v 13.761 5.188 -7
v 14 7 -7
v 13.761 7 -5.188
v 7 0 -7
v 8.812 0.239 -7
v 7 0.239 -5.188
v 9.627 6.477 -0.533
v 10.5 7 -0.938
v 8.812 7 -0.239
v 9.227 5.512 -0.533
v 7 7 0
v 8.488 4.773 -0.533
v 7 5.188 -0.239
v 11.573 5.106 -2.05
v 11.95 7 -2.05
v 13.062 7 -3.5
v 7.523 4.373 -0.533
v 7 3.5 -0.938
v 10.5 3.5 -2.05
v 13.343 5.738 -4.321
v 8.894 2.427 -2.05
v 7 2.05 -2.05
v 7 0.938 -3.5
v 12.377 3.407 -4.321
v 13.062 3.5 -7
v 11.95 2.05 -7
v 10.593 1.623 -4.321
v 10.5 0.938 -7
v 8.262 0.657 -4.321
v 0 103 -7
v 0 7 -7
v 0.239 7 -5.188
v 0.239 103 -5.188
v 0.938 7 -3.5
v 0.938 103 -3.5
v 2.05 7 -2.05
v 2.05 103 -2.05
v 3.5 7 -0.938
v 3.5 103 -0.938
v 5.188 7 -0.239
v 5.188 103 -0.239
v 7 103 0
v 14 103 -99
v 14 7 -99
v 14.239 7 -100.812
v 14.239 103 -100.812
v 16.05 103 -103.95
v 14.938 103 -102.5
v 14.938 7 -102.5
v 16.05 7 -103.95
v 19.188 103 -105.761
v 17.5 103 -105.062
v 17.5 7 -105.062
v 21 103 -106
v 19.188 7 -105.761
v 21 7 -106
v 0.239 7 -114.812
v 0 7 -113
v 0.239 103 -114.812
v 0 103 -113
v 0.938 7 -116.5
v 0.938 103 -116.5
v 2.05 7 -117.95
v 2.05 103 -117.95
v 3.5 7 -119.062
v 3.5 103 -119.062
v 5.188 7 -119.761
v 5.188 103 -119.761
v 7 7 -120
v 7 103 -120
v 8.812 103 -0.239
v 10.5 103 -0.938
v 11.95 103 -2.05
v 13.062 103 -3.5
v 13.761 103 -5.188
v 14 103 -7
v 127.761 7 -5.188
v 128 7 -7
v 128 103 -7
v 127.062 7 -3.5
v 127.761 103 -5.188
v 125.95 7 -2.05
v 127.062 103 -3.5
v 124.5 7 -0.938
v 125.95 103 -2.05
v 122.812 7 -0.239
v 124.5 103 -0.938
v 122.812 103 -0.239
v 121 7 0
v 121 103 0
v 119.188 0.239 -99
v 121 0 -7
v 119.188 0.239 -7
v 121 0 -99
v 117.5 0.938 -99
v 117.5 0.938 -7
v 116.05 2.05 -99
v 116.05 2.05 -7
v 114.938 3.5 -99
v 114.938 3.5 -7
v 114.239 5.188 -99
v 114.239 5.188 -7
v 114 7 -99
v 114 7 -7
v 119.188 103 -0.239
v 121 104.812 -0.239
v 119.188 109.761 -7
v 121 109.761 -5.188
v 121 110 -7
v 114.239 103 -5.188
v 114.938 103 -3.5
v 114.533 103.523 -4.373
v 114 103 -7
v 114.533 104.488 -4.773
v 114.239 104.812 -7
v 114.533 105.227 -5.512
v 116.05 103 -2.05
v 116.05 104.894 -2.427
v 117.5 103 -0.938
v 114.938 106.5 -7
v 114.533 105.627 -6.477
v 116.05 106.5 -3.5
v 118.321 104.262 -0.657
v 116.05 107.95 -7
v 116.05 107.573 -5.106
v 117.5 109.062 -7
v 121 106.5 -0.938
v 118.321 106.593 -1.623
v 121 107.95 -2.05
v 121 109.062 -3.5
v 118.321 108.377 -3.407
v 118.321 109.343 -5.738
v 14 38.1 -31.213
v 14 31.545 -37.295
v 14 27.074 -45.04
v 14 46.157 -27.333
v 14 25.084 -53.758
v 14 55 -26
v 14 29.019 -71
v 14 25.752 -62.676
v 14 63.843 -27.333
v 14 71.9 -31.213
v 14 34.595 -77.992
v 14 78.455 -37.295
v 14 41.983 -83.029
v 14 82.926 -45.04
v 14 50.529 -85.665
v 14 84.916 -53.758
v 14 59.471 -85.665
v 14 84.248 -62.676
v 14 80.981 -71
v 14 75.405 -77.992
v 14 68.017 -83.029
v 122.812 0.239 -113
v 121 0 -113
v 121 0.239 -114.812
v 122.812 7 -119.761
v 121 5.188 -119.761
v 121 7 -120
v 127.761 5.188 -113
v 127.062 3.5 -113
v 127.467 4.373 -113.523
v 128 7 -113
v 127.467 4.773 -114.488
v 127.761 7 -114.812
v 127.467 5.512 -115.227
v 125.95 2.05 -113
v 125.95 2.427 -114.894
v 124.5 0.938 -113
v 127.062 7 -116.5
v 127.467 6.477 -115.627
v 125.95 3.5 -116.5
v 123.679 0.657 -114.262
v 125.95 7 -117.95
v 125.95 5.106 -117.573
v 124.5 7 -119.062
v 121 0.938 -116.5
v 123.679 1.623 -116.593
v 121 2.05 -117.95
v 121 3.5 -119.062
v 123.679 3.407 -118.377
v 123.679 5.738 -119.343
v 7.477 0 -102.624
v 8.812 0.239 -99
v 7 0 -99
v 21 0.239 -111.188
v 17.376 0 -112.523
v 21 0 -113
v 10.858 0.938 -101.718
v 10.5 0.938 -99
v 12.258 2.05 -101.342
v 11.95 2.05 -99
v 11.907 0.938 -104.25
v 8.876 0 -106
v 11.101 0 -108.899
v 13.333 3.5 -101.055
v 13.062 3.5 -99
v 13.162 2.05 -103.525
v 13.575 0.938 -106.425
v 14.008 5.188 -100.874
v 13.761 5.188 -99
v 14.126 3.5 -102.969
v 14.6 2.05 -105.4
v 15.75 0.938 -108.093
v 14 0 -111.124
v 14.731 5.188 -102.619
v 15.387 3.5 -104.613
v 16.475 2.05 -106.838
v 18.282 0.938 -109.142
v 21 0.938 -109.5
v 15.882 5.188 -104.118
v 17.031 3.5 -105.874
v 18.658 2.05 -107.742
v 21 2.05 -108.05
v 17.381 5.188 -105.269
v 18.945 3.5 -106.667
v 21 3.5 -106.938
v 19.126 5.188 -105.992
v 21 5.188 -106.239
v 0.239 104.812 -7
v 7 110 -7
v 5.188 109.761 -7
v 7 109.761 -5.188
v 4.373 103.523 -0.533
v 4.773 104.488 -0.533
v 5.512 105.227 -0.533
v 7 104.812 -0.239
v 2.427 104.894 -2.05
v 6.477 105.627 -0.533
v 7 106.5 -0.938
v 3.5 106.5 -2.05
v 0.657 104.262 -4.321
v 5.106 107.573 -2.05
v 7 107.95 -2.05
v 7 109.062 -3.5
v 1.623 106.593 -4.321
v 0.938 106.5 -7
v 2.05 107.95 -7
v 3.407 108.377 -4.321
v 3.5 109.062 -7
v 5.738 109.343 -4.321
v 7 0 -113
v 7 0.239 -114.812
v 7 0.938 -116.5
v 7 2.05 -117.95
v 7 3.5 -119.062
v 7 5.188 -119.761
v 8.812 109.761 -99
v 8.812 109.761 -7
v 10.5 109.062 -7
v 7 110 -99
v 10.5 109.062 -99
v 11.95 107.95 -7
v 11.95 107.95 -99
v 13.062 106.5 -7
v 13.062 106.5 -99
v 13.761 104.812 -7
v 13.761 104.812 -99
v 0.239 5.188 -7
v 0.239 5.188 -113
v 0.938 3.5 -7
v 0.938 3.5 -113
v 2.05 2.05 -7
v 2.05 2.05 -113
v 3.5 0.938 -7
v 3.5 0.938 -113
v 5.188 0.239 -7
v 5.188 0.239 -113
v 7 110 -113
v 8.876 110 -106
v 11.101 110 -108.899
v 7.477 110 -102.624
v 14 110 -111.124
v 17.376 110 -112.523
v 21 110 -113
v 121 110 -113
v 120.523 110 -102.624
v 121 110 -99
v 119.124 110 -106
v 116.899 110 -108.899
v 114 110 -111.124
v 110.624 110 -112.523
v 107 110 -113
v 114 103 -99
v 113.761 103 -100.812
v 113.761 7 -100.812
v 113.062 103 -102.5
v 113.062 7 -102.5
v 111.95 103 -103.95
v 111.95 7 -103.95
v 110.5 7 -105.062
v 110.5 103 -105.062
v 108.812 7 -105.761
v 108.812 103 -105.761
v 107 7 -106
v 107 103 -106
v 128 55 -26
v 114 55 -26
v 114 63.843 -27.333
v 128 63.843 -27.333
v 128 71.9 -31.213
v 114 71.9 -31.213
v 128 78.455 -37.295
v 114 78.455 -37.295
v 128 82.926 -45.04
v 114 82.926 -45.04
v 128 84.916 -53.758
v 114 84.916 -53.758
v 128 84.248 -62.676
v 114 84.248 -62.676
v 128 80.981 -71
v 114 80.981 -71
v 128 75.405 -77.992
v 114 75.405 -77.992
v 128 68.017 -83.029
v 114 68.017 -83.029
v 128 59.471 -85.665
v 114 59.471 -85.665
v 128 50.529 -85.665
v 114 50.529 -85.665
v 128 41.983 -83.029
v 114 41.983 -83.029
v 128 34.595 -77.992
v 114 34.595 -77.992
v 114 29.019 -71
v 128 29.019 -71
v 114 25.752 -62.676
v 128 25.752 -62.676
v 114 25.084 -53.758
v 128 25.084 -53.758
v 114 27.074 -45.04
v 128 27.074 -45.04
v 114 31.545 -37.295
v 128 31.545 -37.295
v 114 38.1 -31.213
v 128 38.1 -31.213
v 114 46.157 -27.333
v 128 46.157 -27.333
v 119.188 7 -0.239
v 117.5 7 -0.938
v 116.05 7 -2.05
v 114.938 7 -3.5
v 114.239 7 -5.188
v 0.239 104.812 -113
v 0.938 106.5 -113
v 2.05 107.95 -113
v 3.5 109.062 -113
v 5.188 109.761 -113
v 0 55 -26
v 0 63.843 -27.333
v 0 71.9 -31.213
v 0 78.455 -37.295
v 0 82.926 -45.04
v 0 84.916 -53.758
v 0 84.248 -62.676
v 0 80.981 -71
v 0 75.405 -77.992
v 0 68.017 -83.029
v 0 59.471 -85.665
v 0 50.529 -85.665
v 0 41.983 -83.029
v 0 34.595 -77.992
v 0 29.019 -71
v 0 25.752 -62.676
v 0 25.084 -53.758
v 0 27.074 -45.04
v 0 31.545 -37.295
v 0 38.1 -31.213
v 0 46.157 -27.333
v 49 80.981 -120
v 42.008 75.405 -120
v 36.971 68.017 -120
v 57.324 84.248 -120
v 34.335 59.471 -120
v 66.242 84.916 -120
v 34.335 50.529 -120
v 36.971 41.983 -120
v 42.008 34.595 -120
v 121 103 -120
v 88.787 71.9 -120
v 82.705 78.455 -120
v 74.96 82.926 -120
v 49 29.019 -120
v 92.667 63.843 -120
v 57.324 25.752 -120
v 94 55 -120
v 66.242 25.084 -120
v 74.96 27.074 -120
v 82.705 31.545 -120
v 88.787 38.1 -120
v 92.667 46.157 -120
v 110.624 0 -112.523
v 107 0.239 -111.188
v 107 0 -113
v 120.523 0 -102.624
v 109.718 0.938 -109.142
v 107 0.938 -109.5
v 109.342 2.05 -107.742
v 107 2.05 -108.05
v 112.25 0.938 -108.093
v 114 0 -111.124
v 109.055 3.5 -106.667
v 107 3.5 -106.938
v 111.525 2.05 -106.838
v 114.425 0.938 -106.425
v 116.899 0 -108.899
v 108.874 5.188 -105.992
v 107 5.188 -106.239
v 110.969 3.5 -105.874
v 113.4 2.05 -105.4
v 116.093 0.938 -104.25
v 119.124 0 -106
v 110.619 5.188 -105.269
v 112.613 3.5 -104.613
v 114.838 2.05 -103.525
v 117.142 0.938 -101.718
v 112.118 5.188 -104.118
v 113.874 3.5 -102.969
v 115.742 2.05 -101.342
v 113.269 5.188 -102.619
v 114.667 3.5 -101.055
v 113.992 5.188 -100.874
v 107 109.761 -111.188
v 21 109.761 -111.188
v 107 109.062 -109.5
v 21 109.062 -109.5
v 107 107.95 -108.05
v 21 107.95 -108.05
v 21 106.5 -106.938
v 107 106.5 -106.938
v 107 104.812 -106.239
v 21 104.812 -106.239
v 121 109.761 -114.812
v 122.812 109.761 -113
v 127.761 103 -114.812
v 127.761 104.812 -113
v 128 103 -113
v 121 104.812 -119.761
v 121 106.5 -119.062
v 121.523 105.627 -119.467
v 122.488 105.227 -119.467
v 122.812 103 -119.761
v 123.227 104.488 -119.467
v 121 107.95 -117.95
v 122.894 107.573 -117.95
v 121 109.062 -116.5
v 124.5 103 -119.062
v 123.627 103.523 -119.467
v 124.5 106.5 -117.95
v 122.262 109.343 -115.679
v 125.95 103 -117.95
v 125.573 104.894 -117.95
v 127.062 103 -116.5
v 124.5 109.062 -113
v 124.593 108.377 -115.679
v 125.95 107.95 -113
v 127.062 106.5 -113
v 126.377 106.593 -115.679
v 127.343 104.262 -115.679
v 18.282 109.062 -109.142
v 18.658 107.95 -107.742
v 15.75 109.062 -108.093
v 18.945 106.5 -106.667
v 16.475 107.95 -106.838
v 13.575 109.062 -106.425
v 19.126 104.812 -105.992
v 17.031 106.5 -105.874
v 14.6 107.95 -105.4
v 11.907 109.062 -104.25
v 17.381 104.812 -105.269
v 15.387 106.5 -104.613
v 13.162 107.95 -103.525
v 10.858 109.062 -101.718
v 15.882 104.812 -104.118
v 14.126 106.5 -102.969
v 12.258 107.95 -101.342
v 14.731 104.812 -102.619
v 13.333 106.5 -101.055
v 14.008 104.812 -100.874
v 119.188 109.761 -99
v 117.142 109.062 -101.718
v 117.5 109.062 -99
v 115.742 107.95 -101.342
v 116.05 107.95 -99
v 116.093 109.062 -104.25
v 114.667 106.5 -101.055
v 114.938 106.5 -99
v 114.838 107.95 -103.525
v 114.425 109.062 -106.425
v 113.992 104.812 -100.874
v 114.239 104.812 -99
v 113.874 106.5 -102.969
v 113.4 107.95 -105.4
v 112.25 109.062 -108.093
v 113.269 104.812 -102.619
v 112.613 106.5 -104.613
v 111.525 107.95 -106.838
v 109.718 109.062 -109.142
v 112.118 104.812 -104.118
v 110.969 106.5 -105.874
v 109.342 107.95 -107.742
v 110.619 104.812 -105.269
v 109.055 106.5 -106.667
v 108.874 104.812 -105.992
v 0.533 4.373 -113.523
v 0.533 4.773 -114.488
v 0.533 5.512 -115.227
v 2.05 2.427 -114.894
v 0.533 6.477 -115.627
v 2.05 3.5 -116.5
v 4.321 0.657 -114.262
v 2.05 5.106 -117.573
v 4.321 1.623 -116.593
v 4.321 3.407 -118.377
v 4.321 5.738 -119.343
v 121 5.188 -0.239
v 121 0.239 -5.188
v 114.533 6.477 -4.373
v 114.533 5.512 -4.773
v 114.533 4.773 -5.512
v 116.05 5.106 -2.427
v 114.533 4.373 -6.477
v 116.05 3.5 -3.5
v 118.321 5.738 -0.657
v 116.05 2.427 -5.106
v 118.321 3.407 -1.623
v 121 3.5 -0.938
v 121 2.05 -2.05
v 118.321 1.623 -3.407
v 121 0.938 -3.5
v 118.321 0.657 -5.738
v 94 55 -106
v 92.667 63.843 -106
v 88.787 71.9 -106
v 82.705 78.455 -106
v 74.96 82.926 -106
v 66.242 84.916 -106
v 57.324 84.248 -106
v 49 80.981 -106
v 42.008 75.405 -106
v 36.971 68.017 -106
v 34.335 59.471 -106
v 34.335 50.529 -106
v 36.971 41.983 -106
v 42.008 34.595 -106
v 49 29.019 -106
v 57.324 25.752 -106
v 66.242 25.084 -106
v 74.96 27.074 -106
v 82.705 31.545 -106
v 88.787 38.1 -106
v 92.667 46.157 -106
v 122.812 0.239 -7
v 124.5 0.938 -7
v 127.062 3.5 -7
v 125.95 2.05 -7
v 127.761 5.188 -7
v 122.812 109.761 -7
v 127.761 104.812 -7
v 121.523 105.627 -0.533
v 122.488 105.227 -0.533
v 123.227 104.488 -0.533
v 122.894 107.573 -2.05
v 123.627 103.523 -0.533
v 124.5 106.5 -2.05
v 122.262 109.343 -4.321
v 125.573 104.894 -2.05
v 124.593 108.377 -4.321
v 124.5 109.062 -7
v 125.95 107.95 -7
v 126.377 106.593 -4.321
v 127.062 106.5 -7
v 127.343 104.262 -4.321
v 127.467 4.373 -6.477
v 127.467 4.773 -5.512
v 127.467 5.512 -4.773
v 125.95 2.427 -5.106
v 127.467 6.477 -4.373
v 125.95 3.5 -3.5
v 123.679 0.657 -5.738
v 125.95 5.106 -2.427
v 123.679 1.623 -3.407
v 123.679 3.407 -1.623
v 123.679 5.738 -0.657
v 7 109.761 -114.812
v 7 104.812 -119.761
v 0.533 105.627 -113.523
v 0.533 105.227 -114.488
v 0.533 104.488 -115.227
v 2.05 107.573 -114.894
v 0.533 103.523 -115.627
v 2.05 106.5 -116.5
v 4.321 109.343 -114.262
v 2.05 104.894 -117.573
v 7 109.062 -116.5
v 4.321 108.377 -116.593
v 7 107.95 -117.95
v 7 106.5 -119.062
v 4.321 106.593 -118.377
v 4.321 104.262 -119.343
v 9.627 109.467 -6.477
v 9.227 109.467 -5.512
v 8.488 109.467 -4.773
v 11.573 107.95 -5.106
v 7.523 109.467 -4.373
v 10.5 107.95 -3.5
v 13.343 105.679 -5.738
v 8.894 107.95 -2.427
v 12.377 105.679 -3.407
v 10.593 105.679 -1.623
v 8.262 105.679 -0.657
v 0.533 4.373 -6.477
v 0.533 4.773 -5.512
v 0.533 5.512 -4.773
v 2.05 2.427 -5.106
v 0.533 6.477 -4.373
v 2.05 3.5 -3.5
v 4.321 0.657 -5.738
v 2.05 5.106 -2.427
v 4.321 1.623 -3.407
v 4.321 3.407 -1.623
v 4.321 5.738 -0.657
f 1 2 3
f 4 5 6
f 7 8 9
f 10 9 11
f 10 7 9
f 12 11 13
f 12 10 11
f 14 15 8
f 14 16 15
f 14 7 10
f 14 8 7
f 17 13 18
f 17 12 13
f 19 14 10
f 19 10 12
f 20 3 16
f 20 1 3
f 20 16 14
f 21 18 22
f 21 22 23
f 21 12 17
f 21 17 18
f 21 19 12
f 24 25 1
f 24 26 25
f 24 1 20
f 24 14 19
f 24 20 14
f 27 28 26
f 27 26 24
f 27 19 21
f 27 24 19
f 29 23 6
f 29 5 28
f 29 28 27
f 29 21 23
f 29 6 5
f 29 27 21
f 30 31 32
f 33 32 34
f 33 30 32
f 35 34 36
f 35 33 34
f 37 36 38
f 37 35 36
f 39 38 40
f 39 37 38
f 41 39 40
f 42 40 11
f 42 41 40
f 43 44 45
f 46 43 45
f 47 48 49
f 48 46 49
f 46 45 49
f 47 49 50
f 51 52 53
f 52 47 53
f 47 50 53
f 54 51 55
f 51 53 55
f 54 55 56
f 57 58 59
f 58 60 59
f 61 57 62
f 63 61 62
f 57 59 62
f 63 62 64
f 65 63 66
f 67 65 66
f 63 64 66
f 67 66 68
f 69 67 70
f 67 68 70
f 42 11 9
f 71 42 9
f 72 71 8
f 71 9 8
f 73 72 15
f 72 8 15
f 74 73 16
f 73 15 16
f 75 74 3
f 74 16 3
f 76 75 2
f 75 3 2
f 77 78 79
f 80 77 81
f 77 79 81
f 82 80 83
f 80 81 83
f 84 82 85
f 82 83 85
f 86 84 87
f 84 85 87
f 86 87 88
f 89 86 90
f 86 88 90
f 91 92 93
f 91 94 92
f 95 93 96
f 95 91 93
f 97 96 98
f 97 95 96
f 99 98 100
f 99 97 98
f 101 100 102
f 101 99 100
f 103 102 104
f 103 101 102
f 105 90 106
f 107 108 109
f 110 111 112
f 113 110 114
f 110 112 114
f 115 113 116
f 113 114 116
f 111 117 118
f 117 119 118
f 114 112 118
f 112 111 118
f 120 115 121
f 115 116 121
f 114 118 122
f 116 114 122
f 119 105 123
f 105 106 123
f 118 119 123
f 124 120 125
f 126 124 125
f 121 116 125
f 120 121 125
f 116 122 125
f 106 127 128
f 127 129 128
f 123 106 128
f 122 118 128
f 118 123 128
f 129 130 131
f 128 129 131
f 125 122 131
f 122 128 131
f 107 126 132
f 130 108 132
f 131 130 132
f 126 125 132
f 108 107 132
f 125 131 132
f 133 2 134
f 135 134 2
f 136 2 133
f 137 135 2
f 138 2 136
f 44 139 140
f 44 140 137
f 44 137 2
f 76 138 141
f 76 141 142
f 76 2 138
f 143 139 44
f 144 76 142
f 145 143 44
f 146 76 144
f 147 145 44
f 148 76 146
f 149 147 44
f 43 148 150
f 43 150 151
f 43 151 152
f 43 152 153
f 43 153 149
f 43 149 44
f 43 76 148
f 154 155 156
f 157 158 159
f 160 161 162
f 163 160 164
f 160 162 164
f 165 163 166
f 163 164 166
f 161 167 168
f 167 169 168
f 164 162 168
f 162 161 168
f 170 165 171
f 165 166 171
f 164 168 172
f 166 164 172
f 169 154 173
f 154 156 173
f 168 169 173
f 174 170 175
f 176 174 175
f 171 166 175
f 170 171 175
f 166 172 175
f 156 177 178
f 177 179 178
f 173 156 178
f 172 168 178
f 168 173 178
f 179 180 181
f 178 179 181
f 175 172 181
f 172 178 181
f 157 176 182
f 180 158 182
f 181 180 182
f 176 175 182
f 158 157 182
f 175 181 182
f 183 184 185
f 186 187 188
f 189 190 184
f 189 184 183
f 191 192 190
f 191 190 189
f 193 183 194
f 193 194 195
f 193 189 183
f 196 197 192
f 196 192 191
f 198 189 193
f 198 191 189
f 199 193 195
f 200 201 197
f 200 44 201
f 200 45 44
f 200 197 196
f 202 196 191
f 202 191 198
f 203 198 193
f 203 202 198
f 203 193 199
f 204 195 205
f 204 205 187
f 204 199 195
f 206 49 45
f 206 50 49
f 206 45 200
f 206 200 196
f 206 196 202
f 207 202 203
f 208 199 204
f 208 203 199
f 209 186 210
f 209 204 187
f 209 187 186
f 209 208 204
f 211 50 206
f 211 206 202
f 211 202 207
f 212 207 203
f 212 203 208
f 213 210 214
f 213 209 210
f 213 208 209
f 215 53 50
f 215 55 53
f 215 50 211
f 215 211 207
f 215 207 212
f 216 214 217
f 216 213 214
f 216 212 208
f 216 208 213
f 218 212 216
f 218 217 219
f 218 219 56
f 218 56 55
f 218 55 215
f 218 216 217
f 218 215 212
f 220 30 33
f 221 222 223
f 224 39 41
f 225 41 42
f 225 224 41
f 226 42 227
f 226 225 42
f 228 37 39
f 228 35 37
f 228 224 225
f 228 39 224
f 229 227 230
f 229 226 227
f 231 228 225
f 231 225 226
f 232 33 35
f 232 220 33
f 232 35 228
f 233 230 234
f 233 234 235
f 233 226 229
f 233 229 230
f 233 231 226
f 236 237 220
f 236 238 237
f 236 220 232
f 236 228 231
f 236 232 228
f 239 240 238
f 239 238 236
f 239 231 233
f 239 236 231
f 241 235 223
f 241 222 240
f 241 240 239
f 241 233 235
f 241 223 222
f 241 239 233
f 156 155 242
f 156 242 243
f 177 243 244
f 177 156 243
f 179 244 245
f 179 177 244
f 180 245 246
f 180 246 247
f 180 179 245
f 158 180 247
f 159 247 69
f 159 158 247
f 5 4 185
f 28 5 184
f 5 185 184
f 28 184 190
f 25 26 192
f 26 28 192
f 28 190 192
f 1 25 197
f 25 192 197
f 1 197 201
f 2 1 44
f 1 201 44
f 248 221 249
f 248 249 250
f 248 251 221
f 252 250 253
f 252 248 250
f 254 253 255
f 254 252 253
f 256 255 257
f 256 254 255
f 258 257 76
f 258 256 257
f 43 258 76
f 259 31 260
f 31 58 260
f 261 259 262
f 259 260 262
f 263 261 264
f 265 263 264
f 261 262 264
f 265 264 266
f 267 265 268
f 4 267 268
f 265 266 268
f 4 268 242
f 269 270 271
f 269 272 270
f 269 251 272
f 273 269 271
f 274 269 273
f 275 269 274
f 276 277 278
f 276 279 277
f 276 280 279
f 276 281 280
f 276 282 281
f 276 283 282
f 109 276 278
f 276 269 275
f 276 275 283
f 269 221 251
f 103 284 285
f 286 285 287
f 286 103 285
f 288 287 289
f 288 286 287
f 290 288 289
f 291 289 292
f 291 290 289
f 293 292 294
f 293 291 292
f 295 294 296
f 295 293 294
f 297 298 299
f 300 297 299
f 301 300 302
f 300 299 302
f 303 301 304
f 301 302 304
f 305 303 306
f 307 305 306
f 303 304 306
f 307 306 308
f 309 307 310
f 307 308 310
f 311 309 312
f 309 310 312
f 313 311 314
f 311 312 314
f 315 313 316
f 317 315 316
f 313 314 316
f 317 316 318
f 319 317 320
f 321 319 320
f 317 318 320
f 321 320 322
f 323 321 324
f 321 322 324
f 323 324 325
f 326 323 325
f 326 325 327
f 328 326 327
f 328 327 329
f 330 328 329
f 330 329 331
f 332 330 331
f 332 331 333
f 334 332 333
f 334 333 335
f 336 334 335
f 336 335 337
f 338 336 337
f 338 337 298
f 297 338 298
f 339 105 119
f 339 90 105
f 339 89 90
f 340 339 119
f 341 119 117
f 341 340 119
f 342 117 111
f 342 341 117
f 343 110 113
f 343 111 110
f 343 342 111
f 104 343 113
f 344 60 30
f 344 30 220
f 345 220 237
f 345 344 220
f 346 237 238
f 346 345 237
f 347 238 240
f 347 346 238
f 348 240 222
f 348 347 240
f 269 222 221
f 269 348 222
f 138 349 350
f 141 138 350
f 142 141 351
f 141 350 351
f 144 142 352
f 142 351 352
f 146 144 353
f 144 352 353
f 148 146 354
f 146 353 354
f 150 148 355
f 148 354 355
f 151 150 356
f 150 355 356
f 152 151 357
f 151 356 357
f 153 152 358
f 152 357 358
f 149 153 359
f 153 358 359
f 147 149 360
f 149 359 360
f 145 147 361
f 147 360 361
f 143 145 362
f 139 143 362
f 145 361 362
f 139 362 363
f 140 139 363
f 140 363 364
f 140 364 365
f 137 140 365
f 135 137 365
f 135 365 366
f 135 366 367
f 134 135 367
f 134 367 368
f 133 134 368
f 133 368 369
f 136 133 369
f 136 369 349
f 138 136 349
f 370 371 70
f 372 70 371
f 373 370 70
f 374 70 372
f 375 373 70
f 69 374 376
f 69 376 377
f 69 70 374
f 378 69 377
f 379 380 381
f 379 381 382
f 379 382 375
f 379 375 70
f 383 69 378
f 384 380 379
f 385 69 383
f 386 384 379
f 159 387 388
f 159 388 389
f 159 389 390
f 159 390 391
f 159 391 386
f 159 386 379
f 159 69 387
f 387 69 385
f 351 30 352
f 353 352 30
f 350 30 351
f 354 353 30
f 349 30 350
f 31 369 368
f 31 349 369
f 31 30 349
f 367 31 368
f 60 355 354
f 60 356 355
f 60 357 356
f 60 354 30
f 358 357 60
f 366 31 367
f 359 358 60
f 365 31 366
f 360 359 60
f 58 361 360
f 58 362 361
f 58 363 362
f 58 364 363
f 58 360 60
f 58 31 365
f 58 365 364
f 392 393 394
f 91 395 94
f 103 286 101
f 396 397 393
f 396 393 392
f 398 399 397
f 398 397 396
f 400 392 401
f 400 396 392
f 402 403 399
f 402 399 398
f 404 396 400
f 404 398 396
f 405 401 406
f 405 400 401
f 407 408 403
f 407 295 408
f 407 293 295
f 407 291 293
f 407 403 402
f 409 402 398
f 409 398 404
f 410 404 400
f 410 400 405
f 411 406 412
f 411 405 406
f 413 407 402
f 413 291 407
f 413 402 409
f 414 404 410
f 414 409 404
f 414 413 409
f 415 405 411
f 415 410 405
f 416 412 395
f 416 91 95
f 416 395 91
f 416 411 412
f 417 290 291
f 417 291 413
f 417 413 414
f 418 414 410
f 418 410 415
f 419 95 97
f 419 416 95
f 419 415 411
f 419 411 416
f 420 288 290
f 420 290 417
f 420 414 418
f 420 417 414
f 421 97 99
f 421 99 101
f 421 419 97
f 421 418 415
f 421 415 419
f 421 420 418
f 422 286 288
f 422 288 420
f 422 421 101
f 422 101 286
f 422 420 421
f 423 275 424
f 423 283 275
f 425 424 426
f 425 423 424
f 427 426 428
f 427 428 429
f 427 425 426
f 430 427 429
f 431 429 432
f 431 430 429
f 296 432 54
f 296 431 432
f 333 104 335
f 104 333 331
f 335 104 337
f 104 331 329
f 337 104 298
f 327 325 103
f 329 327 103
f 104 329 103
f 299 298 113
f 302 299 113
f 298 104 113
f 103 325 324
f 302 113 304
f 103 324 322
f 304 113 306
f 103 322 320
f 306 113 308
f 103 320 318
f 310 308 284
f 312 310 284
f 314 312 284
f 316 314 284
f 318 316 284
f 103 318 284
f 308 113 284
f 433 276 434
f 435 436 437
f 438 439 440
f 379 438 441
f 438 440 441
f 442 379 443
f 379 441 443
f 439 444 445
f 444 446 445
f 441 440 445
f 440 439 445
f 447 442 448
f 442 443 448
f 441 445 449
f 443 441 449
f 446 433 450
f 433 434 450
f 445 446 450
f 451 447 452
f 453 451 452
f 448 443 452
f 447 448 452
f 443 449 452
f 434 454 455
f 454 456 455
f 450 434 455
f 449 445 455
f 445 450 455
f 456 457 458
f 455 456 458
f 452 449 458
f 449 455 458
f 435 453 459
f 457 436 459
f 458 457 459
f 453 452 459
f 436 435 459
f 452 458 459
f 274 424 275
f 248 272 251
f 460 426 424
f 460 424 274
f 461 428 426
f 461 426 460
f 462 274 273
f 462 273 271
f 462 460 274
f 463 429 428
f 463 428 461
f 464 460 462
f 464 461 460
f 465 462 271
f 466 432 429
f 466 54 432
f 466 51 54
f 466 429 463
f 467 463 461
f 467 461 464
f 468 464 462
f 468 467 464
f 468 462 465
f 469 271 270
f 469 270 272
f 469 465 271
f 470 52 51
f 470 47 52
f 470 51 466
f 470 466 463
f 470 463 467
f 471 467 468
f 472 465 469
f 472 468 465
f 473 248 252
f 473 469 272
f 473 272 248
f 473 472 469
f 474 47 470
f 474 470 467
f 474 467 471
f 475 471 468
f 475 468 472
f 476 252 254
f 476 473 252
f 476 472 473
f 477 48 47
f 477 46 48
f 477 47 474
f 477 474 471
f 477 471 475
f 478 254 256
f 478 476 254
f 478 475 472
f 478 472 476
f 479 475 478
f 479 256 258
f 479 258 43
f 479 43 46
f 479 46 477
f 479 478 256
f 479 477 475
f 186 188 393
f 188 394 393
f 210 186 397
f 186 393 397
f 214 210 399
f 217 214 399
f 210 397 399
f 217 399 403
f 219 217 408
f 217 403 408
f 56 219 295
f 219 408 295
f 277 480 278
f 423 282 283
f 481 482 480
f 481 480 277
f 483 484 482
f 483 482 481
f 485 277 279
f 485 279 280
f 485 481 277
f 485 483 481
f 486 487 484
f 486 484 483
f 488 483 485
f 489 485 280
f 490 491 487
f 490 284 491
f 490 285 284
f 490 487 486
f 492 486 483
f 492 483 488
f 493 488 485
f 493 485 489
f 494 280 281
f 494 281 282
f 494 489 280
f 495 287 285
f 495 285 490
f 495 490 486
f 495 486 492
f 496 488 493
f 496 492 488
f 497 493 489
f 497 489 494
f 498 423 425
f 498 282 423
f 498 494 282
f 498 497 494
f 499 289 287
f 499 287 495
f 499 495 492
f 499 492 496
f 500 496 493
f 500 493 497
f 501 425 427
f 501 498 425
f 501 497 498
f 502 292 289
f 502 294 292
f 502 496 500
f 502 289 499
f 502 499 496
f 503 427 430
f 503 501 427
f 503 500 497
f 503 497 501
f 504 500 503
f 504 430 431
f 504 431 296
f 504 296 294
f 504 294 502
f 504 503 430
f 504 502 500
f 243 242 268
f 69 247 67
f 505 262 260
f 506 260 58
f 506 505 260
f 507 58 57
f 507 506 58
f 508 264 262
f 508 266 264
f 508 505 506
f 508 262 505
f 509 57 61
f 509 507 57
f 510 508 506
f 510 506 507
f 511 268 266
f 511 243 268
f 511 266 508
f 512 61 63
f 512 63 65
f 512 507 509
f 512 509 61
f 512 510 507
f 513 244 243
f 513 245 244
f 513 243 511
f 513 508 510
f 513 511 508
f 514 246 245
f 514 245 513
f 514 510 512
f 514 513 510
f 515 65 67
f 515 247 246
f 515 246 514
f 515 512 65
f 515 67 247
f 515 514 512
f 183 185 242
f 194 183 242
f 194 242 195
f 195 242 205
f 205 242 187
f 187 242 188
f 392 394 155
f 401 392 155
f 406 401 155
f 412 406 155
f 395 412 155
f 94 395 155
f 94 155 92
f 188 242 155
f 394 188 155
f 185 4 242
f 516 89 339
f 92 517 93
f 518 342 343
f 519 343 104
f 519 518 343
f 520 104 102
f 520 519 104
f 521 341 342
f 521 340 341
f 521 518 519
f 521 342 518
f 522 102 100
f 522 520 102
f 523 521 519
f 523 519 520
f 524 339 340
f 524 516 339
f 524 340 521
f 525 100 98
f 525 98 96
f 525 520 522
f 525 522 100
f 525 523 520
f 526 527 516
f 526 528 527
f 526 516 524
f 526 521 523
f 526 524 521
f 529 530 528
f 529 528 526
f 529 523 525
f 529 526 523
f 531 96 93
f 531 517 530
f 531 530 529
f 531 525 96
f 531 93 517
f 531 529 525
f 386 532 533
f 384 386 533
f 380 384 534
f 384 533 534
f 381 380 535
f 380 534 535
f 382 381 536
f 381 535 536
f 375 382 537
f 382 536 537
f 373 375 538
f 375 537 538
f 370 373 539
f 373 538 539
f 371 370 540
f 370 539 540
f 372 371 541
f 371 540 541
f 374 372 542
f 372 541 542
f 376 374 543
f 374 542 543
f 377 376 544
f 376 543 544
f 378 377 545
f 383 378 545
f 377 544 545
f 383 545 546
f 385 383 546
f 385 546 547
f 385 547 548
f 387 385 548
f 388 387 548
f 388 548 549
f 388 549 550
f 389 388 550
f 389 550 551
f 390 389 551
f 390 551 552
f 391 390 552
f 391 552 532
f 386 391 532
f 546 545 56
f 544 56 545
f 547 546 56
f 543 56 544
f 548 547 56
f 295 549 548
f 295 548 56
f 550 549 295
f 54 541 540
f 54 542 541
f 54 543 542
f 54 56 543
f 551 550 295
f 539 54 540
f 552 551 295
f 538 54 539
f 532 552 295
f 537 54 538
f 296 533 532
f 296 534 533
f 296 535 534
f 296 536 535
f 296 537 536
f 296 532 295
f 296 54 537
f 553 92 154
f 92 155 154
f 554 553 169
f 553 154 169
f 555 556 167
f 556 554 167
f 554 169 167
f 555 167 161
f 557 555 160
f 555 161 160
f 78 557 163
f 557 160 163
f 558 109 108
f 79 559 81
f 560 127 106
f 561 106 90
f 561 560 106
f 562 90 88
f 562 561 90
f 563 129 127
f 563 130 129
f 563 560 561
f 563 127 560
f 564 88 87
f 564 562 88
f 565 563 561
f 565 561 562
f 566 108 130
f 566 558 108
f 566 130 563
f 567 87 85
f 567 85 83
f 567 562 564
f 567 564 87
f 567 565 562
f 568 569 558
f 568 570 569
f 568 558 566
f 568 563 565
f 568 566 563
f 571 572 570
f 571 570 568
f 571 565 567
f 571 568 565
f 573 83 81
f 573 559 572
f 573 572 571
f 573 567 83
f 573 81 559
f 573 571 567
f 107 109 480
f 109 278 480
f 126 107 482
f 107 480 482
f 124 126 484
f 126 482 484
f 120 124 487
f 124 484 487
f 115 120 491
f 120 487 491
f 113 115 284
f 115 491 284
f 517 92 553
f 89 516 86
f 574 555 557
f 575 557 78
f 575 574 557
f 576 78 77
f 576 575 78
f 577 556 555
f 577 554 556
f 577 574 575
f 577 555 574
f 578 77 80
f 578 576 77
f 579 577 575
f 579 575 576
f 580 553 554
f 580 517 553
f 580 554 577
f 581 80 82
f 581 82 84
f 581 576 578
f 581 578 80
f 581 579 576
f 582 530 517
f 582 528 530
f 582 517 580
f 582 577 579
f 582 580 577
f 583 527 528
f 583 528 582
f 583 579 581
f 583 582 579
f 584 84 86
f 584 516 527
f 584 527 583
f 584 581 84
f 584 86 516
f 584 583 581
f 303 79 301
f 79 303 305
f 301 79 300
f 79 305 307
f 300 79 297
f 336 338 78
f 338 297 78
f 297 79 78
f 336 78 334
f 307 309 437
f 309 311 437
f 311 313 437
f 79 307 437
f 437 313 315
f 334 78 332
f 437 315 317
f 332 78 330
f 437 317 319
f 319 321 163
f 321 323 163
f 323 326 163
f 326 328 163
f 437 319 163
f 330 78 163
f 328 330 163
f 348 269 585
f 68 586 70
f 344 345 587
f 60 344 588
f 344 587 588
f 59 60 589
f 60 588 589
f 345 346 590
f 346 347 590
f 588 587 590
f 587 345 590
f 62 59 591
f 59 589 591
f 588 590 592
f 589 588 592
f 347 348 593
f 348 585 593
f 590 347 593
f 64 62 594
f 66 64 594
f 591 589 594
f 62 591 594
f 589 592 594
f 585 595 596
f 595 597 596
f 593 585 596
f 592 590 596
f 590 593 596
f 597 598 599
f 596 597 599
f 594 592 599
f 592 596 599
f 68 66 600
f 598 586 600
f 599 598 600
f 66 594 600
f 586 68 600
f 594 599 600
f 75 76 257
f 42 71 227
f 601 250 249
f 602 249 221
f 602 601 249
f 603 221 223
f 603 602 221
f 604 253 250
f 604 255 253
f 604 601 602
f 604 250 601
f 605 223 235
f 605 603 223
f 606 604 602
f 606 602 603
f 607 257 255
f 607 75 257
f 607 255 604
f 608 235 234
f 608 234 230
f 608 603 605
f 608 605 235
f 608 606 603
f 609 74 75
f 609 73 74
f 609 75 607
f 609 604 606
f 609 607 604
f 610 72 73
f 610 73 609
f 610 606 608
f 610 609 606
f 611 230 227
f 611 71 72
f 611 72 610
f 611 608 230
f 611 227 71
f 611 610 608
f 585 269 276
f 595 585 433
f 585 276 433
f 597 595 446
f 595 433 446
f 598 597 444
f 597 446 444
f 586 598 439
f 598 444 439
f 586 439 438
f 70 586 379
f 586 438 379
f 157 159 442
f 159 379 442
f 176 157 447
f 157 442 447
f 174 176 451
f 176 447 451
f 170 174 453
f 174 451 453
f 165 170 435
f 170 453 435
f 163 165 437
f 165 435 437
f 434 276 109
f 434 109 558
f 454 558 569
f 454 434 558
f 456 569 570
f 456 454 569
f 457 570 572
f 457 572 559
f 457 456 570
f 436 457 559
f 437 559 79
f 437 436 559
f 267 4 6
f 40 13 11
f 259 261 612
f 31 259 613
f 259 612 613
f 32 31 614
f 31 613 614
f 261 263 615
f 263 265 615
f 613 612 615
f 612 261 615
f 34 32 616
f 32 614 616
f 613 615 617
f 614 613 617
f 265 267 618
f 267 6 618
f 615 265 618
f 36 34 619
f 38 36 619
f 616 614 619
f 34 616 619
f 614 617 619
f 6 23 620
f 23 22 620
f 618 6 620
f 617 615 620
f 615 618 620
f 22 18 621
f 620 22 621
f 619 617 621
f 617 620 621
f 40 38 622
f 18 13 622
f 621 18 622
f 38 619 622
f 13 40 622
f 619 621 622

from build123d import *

# Parameters (mm, degrees)
SKETCH1_W           = 128
SKETCH1_H           = 120
BOSS_EXTRUDE1_DEPTH = 110
SKETCH2_W           = 100
SKETCH2_H           = 106
CUT_EXTRUDE2_DEPTH  = 208.084523806
SKETCH3_R           = 30
CUT_EXTRUDE3_DEPTH  = 208.084523806
SKETCH4_R           = 30
CUT_EXTRUDE4_DEPTH  = 200.298770694
FILLET1_R           = 7


with BuildPart() as part:
    # Sketch1 → Boss-Extrude1 (new body)
    with BuildSketch(Plane(origin=(0, 0, 0), x_dir=(1, 0, 0), z_dir=(0, 1, 0))):
        with Locations((64, 60)):
            Rectangle(SKETCH1_W, SKETCH1_H)
    extrude(amount=BOSS_EXTRUDE1_DEPTH)

    # Sketch2 → Cut-Extrude2 (cut, through all)
    with BuildSketch(Plane(origin=(0, 110, 0), x_dir=(1, 0, 0), z_dir=(0, 1, 0))):
        with Locations((64, 53)):
            Rectangle(SKETCH2_W, SKETCH2_H)
    extrude(amount=-CUT_EXTRUDE2_DEPTH, mode=Mode.SUBTRACT)

    # Sketch3 → Cut-Extrude3 (cut, through all)
    with BuildSketch(Plane.ZY):
        with Locations((-56, 55)):
            Circle(SKETCH3_R)
    extrude(amount=-CUT_EXTRUDE3_DEPTH, mode=Mode.SUBTRACT)

    # Sketch4 → Cut-Extrude4 (cut, through all)
    with BuildSketch(Plane.XY.offset(-106)):
        with Locations((64, 55)):
            Circle(SKETCH4_R)
    extrude(amount=-CUT_EXTRUDE4_DEPTH, mode=Mode.SUBTRACT)

    # Fillet1
    fillet1_edges = [part.edges().sort_by_distance(p)[0] for p in [
        (128, 110, -60),
        (121, 0, 0),
        (64, 110, -120),
        (121, 110, 0),
        (114, 55, 0),
        (14, 0, -53),
        (14, 55, 0),
        (64, 0, -106),
        (14, 55, -106),
        (114, 0, -53),
        (114, 55, -106),
        (114, 110, -53),
        (64, 110, -106),
        (14, 110, -53),
        (0, 110, -60),
        (64, 0, -120),
        (128, 0, -60),
        (7, 0, 0),
        (0, 0, -60),
        (0, 55, -120),
        (128, 55, -120),
        (128, 55, 0),
        (0, 55, 0),
        (7, 110, 0),
    ]]
    fillet(fillet1_edges, radius=FILLET1_R - 0.0001)  # a hair under: the kernel refuses the full size


solid = part.part
